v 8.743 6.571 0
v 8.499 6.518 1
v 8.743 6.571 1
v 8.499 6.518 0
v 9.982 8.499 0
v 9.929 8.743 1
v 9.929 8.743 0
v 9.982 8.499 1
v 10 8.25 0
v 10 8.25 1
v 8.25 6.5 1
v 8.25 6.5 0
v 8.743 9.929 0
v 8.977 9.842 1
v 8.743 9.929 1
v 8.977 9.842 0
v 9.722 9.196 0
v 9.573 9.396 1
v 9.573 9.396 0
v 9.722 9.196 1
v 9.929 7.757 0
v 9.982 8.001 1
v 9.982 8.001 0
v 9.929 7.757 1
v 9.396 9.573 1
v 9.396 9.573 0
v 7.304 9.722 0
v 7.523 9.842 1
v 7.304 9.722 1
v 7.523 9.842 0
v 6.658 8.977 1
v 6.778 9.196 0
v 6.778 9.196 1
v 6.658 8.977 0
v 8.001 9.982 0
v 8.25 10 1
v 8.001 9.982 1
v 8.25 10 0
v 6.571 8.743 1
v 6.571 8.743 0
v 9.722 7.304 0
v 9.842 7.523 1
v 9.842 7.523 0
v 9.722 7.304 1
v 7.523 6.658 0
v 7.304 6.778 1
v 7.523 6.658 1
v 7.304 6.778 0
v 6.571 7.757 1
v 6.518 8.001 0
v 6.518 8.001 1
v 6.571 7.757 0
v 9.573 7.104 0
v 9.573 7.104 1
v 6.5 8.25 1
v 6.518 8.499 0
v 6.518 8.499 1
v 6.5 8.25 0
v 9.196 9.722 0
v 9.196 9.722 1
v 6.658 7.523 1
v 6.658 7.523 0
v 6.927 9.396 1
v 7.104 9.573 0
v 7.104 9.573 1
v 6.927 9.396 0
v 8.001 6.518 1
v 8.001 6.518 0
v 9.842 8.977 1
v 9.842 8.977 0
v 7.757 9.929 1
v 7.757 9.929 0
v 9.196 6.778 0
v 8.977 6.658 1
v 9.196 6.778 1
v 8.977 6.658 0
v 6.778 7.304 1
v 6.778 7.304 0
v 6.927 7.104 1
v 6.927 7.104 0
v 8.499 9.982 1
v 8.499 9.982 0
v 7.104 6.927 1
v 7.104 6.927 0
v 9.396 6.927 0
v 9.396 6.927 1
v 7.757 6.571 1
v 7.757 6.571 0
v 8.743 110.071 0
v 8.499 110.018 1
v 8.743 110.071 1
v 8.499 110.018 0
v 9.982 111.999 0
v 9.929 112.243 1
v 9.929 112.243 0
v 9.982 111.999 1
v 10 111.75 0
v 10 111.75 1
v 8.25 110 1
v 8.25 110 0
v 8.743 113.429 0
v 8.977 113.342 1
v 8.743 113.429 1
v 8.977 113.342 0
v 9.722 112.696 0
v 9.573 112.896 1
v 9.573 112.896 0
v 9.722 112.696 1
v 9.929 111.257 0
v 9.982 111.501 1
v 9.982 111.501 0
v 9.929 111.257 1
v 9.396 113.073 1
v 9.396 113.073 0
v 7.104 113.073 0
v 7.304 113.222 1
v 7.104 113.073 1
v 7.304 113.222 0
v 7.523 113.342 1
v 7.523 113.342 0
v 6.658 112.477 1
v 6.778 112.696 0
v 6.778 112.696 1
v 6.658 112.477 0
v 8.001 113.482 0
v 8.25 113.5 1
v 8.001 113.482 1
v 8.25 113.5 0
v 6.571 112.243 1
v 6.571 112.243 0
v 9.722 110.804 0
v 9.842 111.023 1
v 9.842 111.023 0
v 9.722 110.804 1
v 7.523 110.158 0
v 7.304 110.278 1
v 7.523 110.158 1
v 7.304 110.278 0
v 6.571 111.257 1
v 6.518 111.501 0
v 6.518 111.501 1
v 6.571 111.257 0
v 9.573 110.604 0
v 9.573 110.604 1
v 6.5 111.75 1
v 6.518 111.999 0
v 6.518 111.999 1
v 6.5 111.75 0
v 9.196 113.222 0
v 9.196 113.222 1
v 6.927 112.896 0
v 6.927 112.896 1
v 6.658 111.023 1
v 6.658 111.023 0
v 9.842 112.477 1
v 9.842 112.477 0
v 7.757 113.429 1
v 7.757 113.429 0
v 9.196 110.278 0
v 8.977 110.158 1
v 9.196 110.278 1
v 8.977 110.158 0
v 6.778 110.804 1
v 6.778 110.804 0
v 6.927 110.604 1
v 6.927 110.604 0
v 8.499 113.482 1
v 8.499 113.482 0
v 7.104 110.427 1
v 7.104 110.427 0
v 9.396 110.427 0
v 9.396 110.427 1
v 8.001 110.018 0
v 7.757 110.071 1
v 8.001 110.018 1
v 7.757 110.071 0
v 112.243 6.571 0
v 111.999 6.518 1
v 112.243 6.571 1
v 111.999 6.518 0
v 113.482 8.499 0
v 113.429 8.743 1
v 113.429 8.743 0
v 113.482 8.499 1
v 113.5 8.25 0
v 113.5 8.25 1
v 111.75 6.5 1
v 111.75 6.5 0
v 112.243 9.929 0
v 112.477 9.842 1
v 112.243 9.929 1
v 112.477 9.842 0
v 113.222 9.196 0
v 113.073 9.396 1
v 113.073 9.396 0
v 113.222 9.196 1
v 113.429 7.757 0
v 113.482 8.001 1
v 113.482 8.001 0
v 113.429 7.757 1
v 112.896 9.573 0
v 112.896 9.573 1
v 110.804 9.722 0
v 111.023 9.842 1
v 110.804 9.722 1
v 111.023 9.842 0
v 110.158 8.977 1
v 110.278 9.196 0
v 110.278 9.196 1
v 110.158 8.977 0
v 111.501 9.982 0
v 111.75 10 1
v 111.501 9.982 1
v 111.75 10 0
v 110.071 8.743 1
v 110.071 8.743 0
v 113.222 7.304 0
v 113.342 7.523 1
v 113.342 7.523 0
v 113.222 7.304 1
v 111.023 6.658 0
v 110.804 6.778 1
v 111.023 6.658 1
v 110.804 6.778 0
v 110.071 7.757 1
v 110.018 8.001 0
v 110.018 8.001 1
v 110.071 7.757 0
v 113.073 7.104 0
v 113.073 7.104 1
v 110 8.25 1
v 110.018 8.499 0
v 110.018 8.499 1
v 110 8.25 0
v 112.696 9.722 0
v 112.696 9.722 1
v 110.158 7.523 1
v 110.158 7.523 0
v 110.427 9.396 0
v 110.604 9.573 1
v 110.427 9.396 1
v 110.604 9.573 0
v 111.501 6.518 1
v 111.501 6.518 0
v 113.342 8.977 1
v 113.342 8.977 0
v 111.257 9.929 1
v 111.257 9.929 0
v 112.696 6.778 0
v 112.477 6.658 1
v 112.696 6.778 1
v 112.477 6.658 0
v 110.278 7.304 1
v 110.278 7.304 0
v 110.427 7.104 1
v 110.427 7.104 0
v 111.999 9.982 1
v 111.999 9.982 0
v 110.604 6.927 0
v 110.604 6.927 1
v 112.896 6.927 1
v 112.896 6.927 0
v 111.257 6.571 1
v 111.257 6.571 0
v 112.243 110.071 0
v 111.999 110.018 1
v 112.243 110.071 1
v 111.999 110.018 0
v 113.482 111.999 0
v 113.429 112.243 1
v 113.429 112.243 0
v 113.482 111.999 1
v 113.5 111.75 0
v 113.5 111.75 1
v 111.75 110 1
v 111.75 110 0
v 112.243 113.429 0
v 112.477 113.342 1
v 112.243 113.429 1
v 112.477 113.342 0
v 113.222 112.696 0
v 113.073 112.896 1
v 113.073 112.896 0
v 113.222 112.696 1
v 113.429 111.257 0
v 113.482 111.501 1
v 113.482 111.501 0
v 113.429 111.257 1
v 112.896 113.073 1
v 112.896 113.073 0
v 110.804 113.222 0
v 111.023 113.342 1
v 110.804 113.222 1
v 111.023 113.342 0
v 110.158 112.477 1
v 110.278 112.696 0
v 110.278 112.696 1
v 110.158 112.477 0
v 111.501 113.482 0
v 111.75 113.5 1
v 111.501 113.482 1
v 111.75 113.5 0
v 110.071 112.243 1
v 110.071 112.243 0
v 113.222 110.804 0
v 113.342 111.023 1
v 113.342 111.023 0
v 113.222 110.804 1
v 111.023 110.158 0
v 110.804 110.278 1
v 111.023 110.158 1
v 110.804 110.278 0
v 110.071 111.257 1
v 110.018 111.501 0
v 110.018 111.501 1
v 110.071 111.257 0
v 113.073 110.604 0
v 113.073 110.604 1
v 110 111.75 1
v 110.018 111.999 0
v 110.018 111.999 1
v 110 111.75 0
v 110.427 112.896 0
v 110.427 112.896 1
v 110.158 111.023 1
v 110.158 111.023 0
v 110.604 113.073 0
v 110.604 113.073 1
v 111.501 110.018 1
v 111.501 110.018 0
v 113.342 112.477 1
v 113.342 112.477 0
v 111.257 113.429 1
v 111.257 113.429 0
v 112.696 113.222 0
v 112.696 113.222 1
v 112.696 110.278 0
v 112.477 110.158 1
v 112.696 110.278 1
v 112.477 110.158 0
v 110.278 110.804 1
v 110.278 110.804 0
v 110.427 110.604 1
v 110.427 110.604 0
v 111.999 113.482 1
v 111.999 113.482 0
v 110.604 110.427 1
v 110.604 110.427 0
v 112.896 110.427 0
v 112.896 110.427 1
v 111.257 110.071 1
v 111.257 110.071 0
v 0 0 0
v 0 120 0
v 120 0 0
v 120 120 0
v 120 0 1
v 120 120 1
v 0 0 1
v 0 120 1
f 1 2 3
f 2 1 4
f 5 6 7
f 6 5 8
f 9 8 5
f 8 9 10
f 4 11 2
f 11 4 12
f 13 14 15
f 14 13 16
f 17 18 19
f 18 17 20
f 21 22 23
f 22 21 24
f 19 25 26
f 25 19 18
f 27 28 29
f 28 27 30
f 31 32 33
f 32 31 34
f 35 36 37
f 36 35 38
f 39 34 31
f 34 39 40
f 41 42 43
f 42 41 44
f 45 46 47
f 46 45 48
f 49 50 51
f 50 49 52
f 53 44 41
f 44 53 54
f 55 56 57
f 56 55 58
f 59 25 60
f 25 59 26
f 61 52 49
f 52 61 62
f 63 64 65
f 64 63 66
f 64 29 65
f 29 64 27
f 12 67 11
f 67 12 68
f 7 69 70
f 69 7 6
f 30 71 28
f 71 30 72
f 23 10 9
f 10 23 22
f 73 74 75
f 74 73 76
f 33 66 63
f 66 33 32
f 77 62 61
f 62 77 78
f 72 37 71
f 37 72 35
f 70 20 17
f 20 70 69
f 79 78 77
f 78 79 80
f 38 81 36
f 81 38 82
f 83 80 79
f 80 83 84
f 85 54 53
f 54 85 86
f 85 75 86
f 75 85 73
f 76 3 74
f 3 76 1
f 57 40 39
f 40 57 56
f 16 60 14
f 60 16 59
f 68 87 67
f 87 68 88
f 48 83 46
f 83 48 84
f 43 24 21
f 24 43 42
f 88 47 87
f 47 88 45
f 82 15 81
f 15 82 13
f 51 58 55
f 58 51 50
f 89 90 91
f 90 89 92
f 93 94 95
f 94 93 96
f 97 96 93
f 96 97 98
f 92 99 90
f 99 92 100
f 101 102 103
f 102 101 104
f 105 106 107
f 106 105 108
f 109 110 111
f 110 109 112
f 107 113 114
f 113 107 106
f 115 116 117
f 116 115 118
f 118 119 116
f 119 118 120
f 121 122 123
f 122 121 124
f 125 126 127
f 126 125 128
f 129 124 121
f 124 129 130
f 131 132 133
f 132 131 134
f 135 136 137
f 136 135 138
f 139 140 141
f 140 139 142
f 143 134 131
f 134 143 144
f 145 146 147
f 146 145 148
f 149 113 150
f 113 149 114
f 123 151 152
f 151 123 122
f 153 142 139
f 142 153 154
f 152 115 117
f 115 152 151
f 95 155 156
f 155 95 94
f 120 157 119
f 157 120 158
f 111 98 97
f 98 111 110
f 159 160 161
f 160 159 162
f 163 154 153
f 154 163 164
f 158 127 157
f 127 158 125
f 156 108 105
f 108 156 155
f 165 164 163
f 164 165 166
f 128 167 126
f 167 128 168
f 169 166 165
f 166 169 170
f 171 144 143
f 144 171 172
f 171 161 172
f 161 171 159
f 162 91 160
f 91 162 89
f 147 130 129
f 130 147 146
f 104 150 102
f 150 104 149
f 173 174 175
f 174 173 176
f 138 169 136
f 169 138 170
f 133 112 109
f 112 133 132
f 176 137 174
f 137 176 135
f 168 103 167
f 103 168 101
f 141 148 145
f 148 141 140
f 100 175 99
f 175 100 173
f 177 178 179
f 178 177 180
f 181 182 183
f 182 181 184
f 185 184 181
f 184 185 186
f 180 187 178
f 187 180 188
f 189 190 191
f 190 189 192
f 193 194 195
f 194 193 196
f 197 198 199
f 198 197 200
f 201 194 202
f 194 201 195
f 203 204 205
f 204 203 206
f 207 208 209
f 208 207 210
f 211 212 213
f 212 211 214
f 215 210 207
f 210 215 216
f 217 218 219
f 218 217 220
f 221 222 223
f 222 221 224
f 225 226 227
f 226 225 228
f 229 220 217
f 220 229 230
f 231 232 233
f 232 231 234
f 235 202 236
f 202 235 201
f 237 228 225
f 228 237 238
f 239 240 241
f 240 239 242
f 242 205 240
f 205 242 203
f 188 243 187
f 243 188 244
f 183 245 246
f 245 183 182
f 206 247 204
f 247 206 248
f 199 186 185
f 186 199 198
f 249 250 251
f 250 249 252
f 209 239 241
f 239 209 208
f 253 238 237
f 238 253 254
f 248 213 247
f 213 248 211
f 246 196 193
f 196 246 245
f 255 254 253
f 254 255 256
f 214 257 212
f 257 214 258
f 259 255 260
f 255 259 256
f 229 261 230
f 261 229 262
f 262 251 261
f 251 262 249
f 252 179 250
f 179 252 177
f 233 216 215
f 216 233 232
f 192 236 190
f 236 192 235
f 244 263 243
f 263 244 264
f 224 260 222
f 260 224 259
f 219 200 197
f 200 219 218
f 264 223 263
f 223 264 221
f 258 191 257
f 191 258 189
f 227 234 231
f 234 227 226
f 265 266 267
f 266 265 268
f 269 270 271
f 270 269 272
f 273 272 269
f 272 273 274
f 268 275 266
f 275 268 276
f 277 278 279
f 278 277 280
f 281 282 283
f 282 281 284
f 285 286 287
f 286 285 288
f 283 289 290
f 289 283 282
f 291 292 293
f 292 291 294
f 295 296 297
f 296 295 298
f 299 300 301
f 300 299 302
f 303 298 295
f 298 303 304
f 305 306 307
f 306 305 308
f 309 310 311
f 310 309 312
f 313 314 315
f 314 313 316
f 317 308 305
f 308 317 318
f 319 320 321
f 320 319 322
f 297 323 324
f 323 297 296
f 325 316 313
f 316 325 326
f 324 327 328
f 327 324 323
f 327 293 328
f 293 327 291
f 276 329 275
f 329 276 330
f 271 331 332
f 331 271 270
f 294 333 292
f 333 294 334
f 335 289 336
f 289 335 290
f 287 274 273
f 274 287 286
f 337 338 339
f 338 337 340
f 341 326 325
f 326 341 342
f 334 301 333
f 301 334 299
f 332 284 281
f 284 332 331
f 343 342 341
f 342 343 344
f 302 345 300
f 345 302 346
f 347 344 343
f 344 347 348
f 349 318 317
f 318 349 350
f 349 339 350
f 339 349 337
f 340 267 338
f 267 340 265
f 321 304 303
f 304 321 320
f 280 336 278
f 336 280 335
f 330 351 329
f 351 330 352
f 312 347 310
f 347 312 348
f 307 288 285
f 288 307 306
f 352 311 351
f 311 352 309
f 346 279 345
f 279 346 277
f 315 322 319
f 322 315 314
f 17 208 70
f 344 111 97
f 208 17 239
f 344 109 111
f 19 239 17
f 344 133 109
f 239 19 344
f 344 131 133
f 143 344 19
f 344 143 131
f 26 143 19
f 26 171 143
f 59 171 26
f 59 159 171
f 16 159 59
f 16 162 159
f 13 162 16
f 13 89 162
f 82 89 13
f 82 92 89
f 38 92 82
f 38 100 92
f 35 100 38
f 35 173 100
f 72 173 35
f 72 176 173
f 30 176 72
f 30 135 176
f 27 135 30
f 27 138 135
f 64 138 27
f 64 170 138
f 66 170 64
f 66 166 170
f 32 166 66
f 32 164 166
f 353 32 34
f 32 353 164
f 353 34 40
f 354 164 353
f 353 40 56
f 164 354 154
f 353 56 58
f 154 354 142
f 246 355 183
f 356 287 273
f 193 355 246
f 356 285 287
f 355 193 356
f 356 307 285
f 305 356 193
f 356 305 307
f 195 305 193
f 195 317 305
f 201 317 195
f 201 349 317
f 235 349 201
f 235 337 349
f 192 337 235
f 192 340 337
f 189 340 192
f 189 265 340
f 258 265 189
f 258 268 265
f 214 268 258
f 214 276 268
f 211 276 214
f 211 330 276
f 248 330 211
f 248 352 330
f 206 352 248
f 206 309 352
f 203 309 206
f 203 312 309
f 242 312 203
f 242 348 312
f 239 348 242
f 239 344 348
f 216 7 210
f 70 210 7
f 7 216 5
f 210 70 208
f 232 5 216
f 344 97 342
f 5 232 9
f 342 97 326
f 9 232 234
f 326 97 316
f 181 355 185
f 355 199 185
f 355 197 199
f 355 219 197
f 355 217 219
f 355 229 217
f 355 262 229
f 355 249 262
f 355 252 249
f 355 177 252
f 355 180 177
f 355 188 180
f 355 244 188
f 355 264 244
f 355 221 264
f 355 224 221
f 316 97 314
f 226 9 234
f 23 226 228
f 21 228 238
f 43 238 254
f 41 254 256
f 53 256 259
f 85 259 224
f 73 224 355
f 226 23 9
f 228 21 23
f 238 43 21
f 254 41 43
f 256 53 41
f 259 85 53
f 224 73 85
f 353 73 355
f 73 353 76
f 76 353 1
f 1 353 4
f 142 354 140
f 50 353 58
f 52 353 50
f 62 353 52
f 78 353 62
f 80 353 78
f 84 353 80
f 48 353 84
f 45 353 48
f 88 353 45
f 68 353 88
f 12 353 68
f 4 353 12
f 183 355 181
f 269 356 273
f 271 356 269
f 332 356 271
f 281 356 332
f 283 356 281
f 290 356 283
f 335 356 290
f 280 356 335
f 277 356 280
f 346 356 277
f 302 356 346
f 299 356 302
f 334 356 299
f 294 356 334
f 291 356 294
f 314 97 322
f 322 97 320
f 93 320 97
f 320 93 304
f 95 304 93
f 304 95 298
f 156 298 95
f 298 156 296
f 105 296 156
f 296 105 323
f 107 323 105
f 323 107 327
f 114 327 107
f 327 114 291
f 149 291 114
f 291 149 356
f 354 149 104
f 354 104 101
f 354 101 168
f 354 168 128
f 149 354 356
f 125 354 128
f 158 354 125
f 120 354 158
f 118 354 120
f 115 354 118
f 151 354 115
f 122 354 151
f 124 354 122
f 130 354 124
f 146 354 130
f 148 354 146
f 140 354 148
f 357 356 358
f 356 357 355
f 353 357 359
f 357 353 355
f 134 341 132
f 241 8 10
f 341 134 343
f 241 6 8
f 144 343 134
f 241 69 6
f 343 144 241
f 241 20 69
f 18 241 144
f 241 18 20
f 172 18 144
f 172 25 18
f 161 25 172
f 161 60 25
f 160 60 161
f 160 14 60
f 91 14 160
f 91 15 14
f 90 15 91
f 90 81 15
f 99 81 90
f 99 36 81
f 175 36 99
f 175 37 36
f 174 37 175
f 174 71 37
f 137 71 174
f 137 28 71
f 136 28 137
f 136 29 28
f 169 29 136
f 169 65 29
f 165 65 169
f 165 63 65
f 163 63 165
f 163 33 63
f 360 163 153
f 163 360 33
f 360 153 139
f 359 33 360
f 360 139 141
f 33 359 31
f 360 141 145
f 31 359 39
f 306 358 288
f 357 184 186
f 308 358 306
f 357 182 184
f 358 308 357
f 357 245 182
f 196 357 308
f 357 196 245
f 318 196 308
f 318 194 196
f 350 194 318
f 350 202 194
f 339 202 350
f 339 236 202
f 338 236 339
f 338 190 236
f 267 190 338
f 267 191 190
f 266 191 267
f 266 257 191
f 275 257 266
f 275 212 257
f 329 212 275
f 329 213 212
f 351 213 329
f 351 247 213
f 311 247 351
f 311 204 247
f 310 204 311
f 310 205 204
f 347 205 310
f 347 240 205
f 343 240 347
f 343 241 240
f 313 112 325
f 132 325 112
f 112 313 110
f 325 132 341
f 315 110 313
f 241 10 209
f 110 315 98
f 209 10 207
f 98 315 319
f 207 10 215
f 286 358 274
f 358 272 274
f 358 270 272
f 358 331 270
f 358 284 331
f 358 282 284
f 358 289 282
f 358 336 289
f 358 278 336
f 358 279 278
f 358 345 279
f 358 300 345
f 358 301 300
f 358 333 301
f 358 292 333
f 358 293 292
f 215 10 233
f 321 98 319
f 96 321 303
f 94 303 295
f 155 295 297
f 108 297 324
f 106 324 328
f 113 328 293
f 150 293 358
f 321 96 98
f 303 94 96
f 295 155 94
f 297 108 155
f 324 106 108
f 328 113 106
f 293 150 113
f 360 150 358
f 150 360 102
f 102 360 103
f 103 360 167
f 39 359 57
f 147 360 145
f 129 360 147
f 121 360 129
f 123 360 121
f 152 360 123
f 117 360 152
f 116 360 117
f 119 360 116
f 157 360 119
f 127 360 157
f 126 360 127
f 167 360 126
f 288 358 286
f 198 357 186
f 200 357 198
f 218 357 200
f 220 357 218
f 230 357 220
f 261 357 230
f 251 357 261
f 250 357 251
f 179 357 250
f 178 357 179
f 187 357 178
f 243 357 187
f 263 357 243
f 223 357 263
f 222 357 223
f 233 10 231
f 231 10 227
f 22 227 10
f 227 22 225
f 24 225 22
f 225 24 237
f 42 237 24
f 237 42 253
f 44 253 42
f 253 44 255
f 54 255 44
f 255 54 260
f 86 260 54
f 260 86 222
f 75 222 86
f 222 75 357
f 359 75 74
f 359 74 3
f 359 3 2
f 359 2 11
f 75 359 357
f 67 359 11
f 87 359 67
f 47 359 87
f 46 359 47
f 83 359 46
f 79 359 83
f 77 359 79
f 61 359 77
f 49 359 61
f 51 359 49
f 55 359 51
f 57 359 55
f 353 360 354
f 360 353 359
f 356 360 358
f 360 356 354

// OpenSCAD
// =============================================
// 3D: ventilation stub — flat plate with 4 mount holes
// Version: 1.0
// Author: generator
// =============================================

description = "120x120x2 mm plate with 4 holes Ø3.5, 103.5 mm spacing";
version_str = "1.0";

// ----------------------------
// Фрагменты: назовите элементы короткими именами с _
// - base: основная деталь (плита с отверстиями)
// - plate_body: тело плиты
// - mount_holes: массив крепёжных отверстий
// ----------------------------

// Общие модули
use <../modules.scad>;

// ----------------------------
// Точность аппроксимации окружностей (обязательно)
// ----------------------------
$fn = 0;        // фиксированную сегментацию отключаем
$fa = 6;        // 5–8° обычно достаточно
$fs = 0.35;     // ≈ диаметр сопла (0.3–0.5 для сопла 0.4)
pin_fs = 0.25;  // чуть тоньше для штырей и отверстий

// ----------------------------
// Режим печати тест‑фрагментов (обязательно)
// ----------------------------
test_fragment = false;   // true — печатать только угловые фрагменты
frag_size     = 20;      // размер квадрата вырезки, мм
frag_index    = 0;       // 0=НЛ, 1=ВЛ, 2=НП, 3=ВП
frag_gap_x    = 10;      // зазор между фрагментами по X, мм
frag_h_extra  = 20;      // запас по высоте клипа, мм

// ----------------------------
// Общие доп. параметры (обязательно)
// ----------------------------
tiny = 0.1;                  // небольшой зазор для булевых операций
edge_chamfer_z = 0;          // высота фаски по Z (мм)
edge_chamfer_x = 0;          // горизонтальный вылет фаски по X (на сторону), мм
edge_chamfer_y = 0;          // горизонтальный вылет фаски по Y (на сторону), мм
screen_frame_gap = 0.2;      // только для высоты вычитаний

// ----------------------------
// Параметры модели (все размеры в мм)
// ----------------------------
plate_x = 120;               // ширина плиты по X
plate_y = 120;               // глубина плиты по Y
base_h  = 1;                 // толщина плиты по Z
corner_r = 0;                // скругление углов плиты по XY

hole_diam     = 3.5;         // диаметр отверстий
holes_spacing = 103.5;       // расстояние между центрами по X и Y

// Вычисляемые
hole_ofs = holes_spacing/2;  // смещение отверстий от центра по X/Y

// ============================
// Модули фрагментов модели
// ============================

// Тело плиты с опциональной нижней фаской по периметру
module plate_body(){
  ch = clamp_chz(base_h, edge_chamfer_z);
  if (ch > tiny && min(edge_chamfer_x, edge_chamfer_y) > tiny) {
    // унифицированная фаска (используем минимальное значение)
    ch_uni = min(ch, edge_chamfer_x, edge_chamfer_y);
    chamfer_rr_extrude(size=[plate_x, plate_y], h=base_h, r=corner_r, ch=ch_uni);
  } else {
    rr_extrude(size=[plate_x, plate_y], r=corner_r, h=base_h);
  }
}

// Крепёжные отверстия (4 шт. по углам квадрата holes_spacing)
module mount_holes(){
  cx = plate_x/2; cy = plate_y/2;
  for (px = [-hole_ofs, hole_ofs])
    for (py = [-hole_ofs, hole_ofs])
      translate([cx + px, cy + py, -screen_frame_gap])
        cylinder(h=base_h + 2*screen_frame_gap, d=hole_diam, $fs=pin_fs, $fa=6);
}

// Основная деталь
module base(){
  difference(){
    plate_body();
    mount_holes();
  }
}

// ============================
// Вывод всех фрагментов
// ============================
module show_all(){
  // Используем клиппер углов из библиотеки по внешним габаритам плиты
  clip_for_fragments_bbox(
    plate_x, plate_y, base_h,
    test_fragment, frag_size, frag_index, frag_h_extra
  ) base();
}

// ============================
// Точка входа
// ============================
module main(){ show_all(); }
main();
